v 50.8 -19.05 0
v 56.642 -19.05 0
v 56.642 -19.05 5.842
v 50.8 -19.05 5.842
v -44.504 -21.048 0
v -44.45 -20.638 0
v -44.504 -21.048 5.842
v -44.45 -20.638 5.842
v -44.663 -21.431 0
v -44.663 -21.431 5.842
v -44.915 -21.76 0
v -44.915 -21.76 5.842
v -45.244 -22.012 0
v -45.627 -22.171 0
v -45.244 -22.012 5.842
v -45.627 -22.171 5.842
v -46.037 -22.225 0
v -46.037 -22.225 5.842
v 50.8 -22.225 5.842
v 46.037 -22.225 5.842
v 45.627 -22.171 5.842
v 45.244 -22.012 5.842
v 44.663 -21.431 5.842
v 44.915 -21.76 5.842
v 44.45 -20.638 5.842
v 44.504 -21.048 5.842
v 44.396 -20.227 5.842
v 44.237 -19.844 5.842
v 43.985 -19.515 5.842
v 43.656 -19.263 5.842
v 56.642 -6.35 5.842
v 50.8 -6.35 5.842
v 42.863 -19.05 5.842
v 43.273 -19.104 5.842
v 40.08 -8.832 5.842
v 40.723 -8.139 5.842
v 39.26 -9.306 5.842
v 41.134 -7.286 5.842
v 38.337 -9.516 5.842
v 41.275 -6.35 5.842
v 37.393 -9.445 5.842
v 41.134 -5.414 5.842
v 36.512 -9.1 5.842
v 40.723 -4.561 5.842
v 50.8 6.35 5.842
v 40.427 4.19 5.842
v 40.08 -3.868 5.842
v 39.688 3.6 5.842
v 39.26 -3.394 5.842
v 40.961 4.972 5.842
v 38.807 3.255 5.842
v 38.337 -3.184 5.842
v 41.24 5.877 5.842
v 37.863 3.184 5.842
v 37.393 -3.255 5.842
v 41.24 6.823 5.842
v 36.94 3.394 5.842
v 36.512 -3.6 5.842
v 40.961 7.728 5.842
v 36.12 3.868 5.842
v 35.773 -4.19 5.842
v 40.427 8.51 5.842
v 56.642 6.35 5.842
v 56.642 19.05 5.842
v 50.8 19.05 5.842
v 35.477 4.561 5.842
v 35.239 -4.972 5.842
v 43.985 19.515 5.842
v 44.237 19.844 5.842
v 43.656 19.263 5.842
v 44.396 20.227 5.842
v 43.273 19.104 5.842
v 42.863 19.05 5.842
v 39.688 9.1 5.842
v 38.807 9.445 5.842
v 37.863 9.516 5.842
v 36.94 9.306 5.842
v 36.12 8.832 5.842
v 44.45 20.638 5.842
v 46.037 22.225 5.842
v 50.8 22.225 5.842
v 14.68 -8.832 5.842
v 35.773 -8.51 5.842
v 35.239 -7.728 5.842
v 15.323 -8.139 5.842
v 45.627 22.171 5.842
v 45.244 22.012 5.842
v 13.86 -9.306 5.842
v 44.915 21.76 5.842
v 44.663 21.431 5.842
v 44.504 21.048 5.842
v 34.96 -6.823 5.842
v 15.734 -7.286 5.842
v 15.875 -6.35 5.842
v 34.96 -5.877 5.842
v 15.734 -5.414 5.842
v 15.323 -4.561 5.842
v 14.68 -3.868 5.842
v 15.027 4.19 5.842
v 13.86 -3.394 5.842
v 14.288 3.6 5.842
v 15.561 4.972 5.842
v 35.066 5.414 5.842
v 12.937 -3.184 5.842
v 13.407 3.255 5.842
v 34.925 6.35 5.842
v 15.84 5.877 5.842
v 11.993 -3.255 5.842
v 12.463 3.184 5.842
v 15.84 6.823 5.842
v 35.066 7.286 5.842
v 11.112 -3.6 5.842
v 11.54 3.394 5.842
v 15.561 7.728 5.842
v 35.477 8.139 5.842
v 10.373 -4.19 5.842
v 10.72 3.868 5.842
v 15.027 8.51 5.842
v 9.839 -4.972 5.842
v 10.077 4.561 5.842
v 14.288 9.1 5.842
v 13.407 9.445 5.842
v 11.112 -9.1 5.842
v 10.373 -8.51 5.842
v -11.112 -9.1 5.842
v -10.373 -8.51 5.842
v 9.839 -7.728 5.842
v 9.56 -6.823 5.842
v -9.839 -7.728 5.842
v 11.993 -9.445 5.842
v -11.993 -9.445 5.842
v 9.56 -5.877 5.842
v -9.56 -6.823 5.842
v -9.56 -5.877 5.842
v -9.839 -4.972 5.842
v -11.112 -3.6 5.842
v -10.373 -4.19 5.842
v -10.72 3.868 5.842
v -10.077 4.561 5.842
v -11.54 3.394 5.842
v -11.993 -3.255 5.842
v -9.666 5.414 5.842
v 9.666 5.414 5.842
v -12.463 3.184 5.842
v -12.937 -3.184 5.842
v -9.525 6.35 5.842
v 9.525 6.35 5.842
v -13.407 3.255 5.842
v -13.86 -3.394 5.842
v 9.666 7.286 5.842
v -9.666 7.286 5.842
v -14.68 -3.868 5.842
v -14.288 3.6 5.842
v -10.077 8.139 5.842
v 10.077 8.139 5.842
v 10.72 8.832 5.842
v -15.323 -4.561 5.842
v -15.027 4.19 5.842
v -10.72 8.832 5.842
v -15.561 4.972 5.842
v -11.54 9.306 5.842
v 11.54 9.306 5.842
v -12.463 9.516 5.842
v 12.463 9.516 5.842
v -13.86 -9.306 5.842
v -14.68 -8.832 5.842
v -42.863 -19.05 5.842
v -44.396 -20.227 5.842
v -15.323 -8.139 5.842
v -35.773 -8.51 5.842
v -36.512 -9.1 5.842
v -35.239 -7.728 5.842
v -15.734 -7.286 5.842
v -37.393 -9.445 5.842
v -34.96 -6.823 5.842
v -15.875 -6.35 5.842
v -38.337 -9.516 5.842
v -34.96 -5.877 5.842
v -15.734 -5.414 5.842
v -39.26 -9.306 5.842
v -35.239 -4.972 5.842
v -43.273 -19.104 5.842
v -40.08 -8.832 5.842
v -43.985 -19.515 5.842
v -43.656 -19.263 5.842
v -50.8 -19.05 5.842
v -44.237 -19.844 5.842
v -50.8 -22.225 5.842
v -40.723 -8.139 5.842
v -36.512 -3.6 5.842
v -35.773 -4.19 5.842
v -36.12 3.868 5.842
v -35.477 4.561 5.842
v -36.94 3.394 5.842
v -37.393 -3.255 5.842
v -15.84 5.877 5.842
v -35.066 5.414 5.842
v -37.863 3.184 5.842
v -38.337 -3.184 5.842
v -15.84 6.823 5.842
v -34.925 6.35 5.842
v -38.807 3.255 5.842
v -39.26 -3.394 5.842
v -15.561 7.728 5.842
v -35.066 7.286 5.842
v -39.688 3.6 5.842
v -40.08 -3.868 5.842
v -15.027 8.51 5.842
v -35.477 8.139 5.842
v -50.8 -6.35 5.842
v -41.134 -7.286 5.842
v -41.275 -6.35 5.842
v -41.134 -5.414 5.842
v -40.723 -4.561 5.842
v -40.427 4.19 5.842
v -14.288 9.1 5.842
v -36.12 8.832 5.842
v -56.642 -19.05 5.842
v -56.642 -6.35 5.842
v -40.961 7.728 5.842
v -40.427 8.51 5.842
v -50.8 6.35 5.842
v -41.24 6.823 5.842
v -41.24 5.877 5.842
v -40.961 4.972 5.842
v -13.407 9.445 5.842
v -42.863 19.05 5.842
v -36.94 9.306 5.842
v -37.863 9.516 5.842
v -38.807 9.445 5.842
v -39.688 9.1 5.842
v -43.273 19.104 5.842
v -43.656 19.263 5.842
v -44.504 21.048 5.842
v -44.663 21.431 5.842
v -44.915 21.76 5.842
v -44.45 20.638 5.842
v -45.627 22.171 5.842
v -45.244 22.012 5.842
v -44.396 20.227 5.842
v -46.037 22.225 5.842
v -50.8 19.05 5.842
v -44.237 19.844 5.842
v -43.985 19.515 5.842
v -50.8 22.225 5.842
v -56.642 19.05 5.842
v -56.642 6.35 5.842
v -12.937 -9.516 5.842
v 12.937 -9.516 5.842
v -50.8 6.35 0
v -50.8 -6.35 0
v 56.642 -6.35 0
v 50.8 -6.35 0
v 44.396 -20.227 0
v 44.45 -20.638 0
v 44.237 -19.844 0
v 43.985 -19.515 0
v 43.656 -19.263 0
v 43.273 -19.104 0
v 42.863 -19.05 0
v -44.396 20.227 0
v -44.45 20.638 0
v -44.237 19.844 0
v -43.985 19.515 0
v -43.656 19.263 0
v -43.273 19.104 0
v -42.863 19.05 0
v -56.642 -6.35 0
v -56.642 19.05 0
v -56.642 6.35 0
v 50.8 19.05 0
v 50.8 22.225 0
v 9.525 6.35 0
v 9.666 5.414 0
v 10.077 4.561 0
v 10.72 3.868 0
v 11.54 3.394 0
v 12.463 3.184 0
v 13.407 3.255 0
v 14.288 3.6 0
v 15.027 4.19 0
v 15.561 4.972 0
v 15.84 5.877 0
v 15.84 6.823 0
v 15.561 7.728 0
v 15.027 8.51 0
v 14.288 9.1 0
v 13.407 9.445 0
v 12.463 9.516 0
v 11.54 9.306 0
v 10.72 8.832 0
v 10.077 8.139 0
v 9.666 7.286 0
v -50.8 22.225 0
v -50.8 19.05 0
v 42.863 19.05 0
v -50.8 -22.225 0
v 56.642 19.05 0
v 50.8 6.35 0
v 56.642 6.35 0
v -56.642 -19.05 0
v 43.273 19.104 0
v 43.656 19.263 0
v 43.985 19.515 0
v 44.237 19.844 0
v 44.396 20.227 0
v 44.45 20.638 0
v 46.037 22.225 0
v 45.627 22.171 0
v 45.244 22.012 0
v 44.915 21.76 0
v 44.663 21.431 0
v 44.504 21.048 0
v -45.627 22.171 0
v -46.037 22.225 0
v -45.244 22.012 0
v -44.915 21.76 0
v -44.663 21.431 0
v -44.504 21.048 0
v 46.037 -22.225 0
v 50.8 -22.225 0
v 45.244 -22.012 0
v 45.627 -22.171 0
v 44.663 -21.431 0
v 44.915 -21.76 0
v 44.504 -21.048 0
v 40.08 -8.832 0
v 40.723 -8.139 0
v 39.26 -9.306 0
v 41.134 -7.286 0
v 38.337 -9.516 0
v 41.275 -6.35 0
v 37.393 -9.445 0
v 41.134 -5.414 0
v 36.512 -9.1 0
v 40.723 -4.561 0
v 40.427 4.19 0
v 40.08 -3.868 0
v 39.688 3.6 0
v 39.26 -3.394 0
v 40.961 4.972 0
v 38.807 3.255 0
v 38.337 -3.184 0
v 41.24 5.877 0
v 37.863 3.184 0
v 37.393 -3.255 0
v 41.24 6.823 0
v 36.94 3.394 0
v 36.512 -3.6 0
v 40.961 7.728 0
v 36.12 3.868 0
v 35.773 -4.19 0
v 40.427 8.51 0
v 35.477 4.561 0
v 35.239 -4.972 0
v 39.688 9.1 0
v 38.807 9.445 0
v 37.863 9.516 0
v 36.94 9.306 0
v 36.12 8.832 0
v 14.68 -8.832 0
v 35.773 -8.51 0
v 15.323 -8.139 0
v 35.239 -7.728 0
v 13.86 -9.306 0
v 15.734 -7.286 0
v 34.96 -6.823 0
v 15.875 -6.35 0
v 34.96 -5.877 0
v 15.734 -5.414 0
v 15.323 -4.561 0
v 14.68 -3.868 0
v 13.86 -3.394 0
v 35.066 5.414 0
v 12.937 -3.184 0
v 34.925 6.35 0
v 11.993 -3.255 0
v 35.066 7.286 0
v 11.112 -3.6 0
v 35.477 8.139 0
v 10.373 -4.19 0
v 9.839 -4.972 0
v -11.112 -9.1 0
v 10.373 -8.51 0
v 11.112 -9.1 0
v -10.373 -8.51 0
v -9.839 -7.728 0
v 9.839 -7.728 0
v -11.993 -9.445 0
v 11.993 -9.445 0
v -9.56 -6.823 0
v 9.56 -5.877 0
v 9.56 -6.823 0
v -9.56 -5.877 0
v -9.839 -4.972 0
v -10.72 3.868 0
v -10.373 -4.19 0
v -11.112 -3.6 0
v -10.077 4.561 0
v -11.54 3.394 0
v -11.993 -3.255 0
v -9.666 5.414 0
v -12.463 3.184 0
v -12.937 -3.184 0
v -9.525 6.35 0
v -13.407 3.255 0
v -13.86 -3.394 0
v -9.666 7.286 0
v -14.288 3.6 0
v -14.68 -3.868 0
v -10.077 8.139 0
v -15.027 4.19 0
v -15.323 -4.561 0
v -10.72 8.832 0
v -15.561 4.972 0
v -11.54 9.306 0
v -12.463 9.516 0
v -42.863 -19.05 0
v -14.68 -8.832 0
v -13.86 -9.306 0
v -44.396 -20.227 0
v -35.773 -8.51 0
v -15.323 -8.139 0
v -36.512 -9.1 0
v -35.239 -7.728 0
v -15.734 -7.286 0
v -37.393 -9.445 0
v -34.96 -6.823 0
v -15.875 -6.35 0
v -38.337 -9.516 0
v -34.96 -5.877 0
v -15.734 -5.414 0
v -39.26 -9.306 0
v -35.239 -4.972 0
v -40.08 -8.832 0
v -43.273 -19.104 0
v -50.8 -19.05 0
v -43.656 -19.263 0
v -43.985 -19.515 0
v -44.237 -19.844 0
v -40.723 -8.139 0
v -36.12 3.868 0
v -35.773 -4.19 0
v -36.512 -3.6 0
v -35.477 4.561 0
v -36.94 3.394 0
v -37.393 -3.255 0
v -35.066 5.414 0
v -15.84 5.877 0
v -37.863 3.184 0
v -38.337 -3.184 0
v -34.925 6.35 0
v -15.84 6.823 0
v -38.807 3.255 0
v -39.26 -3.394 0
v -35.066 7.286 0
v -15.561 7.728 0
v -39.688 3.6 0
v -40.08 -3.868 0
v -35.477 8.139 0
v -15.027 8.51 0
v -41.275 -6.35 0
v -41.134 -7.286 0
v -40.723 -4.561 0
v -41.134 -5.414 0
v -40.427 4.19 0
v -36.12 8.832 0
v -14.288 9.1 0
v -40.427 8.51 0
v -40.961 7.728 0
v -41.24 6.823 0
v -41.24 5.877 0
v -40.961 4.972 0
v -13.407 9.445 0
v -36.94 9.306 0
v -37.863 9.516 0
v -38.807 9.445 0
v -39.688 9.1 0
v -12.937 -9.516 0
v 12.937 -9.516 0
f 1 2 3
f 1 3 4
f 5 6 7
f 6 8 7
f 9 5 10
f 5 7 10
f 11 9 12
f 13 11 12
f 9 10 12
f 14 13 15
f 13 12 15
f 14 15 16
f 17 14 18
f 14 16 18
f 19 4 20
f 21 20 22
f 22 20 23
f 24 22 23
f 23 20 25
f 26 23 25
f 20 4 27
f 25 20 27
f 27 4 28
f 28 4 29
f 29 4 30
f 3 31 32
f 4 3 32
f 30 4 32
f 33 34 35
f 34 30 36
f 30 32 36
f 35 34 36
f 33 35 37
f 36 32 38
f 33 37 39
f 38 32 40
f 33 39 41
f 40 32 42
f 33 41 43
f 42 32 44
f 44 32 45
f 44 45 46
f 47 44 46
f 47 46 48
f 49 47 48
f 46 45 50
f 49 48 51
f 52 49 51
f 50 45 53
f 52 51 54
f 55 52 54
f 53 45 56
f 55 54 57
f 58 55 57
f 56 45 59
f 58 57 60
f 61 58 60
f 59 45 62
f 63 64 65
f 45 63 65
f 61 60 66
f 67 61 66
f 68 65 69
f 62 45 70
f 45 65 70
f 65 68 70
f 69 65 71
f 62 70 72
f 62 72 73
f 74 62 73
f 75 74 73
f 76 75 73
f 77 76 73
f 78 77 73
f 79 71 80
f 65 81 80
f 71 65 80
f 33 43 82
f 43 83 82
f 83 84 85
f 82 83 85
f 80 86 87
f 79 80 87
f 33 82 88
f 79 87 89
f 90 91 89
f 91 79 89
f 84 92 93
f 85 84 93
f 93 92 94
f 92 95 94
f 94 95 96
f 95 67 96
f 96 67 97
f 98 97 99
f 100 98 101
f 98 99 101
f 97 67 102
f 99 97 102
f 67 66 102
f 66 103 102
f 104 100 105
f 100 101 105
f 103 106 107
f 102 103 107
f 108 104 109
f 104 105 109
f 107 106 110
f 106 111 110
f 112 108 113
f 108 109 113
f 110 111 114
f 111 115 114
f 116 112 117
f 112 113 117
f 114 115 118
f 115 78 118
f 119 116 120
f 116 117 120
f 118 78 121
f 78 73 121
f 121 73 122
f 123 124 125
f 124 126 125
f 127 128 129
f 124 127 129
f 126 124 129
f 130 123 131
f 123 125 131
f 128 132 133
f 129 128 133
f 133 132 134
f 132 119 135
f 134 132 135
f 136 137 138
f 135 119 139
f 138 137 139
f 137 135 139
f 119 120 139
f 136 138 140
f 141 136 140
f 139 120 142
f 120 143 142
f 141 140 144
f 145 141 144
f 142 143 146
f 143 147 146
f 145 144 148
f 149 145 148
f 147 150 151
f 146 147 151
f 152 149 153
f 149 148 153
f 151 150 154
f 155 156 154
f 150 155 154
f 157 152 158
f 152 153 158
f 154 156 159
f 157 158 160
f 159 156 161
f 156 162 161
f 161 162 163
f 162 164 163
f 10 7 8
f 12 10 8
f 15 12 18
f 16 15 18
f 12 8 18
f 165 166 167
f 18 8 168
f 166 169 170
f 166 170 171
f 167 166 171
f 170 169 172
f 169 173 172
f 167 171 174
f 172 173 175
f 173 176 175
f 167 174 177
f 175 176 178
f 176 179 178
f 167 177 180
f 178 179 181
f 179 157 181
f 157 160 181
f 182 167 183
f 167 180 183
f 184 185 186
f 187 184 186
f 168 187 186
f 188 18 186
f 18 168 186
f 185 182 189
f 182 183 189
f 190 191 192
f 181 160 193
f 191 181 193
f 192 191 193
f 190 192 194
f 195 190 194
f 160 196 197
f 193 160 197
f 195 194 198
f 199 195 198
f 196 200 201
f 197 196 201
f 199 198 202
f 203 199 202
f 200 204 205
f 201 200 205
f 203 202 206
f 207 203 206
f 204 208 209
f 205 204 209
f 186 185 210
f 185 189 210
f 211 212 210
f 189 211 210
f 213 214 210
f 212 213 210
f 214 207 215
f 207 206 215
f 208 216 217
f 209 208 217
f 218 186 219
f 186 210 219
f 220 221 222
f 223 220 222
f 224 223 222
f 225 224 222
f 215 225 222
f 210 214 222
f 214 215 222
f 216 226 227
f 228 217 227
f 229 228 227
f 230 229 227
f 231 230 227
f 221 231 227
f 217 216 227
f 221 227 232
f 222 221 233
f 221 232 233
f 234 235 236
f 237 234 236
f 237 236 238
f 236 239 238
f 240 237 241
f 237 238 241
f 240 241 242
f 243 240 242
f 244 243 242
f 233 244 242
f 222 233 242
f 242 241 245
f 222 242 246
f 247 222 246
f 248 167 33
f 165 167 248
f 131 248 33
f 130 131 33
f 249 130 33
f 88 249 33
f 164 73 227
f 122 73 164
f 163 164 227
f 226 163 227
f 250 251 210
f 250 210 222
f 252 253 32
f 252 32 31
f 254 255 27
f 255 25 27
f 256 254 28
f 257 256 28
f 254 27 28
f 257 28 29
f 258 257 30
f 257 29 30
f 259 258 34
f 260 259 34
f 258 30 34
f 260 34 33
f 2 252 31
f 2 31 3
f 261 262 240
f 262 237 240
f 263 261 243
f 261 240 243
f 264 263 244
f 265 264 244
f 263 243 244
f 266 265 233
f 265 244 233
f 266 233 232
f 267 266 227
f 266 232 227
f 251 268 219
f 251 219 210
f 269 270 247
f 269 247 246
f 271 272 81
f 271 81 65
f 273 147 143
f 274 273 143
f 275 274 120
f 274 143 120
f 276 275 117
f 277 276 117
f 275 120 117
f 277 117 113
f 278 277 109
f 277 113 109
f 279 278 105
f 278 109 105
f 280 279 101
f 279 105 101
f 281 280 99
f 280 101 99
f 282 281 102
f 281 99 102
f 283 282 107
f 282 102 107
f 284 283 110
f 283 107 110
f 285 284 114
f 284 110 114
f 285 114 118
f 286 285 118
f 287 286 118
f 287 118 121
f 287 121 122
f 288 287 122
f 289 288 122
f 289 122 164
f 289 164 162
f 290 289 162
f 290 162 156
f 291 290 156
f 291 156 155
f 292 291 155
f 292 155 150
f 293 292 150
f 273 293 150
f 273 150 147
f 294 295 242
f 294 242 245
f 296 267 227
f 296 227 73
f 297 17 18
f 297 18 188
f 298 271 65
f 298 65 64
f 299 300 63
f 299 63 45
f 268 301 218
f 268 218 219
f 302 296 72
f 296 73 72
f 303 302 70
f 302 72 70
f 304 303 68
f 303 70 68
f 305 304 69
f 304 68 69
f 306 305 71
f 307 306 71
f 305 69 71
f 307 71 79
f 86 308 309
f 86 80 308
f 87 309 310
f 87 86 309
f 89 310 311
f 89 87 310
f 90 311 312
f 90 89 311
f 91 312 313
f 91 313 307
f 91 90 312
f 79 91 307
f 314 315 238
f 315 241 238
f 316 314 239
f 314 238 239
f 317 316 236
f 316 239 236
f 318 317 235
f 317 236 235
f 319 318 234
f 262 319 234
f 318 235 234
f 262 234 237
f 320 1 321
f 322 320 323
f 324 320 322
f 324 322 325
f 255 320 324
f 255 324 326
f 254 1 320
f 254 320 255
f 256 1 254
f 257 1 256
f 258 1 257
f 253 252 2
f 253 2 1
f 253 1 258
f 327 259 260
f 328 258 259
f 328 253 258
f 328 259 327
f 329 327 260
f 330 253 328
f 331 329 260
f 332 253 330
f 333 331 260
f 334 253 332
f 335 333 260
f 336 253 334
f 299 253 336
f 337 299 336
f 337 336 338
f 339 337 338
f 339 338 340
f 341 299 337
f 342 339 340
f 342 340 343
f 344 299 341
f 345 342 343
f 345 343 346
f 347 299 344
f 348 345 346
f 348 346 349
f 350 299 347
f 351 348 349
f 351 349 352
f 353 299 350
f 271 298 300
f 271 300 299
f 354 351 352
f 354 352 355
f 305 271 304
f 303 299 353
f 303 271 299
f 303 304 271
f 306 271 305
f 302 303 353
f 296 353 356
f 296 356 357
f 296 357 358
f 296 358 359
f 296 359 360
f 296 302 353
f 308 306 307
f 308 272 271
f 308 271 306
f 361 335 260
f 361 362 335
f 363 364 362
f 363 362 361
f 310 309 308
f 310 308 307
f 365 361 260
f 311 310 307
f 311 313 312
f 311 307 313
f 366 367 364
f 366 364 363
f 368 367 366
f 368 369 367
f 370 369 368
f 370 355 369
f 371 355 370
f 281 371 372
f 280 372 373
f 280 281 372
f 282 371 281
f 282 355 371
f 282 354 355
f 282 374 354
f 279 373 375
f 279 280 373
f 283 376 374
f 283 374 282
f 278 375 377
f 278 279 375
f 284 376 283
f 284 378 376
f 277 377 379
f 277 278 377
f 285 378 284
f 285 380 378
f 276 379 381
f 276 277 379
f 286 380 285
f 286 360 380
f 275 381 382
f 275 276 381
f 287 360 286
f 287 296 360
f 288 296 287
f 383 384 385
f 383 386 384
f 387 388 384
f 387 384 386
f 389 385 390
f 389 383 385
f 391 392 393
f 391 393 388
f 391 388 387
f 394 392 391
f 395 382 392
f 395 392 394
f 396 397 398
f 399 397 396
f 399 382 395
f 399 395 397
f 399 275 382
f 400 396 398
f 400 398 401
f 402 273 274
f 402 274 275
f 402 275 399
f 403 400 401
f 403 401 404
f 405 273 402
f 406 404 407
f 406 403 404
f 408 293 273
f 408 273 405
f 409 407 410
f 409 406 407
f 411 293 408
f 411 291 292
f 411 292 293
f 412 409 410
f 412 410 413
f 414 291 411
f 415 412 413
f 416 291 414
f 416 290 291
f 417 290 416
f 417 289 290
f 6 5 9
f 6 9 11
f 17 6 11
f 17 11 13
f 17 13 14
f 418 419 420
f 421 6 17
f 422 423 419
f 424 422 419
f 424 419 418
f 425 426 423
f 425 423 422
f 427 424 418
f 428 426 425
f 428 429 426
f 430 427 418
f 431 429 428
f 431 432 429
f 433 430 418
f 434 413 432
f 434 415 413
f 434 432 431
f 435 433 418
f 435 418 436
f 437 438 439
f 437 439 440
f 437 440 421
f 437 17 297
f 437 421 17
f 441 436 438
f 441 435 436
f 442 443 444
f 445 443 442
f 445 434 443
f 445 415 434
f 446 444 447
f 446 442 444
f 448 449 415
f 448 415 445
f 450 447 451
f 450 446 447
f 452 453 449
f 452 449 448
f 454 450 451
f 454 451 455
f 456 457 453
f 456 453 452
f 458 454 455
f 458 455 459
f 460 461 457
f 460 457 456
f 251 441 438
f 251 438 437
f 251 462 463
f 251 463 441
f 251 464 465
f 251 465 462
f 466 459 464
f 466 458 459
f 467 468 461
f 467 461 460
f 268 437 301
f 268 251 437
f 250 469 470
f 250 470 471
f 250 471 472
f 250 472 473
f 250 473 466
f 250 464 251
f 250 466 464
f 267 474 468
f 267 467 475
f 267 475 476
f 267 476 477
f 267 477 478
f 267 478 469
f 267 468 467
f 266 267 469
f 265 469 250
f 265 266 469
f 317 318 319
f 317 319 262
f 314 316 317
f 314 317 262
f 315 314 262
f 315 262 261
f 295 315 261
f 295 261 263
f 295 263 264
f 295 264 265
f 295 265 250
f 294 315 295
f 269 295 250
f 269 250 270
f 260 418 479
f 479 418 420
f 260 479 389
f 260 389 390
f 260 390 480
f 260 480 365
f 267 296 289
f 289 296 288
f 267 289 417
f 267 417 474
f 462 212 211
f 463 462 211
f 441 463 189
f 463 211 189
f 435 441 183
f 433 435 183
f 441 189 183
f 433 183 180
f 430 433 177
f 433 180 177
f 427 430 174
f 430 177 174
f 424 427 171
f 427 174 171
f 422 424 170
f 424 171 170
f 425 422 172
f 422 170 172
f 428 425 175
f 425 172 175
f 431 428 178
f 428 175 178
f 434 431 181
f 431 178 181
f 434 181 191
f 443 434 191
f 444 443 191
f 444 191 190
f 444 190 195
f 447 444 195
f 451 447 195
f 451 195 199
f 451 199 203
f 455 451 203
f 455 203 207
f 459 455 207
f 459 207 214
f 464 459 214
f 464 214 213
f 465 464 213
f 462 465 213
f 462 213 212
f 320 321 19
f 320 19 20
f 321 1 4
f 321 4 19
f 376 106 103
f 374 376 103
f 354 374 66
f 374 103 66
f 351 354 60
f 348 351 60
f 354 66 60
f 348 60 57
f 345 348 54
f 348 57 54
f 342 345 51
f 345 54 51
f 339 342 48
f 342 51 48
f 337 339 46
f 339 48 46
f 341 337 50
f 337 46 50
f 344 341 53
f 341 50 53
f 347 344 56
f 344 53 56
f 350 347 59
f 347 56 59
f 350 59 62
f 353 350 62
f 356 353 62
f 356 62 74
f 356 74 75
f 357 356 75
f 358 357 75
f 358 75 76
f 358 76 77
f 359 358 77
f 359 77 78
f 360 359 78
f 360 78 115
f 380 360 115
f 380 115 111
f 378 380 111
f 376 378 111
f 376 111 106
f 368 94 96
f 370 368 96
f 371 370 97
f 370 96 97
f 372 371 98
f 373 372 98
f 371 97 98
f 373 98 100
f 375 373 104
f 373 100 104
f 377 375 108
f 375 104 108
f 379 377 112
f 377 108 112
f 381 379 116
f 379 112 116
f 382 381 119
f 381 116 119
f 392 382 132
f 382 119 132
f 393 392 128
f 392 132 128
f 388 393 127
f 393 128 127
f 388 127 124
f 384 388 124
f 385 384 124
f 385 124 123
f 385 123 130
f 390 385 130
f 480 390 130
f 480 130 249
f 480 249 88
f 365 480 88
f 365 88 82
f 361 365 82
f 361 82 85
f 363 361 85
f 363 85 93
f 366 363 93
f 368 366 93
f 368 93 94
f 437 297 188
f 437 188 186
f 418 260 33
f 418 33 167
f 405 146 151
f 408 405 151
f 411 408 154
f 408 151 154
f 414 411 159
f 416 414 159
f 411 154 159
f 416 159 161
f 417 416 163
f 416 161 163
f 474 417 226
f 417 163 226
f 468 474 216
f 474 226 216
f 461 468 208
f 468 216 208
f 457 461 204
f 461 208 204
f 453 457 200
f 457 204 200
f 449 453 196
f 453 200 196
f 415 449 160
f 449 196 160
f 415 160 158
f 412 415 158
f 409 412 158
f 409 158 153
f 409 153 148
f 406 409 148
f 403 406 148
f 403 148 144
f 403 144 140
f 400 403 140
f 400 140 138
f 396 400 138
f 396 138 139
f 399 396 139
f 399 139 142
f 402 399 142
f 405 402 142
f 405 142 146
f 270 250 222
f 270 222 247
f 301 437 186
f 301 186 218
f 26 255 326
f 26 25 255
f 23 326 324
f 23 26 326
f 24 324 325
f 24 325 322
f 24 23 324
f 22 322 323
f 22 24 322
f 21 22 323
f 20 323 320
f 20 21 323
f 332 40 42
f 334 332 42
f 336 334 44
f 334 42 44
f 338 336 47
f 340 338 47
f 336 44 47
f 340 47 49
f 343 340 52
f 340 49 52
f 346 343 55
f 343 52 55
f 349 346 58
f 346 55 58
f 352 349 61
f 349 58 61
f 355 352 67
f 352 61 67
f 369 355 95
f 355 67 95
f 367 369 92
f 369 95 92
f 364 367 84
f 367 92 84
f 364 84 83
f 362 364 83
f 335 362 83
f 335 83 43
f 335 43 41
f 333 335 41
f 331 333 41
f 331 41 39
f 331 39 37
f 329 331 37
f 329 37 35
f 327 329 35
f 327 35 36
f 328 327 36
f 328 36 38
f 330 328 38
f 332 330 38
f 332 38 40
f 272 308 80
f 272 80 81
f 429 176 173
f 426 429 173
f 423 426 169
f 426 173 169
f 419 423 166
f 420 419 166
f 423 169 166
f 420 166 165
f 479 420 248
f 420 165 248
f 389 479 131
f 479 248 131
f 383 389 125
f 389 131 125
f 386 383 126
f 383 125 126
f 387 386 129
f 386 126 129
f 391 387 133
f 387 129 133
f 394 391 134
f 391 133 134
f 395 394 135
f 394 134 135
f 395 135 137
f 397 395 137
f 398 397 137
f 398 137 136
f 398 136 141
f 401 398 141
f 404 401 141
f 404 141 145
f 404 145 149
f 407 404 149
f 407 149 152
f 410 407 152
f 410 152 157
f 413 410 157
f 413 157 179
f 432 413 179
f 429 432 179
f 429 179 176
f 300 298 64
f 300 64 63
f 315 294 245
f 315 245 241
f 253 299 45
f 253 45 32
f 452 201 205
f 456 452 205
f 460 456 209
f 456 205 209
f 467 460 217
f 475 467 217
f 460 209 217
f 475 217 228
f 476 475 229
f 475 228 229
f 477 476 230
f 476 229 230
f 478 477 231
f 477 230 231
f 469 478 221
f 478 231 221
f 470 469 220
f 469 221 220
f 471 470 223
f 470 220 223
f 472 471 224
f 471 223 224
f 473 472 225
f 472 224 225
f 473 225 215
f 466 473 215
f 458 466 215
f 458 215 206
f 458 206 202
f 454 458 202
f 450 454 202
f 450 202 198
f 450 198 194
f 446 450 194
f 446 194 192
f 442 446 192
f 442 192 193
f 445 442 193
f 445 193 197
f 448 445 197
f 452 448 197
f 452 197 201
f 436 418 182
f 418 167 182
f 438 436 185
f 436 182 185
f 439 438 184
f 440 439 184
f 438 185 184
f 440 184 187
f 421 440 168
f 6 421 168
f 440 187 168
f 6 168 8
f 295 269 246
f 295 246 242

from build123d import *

# Parameters (mm, degrees)
BOSS_EXTRUDE1_DEPTH = 5.842
FILLET1_R           = 1.5875
SKETCH2_R           = 3.175
CUT_EXTRUDE1_DEPTH  = 62.126064432


with BuildPart() as part:
    # Sketch1 → Boss-Extrude1 (new body)
    with BuildSketch(Plane.XY):
        Polygon((50.8, -22.225), (44.45, -22.225), (44.45, -19.05), (-44.45, -19.05), (-44.45, -22.225), (-50.8, -22.225), (-50.8, -19.05), (-56.642, -19.05), (-56.642, -6.35), (-50.8, -6.35), (-50.8, 6.35), (-56.642, 6.35), (-56.642, 19.05), (-50.8, 19.05), (-50.8, 22.225), (-44.45, 22.225), (-44.45, 19.05), (44.45, 19.05), (44.45, 22.225), (50.8, 22.225), (50.8, 19.05), (56.642, 19.05), (56.642, 6.35), (50.8, 6.35), (50.8, -6.35), (56.642, -6.35), (56.642, -19.05), (50.8, -19.05), align=None)
    extrude(amount=BOSS_EXTRUDE1_DEPTH)

    # Fillet1
    fillet1_edges = [part.edges().sort_by_distance(p)[0] for p in [
        (-44.45, -19.05, 2.921),
        (44.45, -19.05, 2.921),
        (44.45, 19.05, 2.921),
        (-44.45, 19.05, 2.921),
    ]]
    fillet(fillet1_edges, radius=FILLET1_R)
    fillet1_2_edges = [part.edges().sort_by_distance(p)[0] for p in [
        (-44.45, -22.225, 2.921),
        (44.45, -22.225, 2.921),
        (44.45, 22.225, 2.921),
        (-44.45, 22.225, 2.921),
    ]]
    fillet(fillet1_2_edges, radius=FILLET1_R - 0.0001)  # a hair under: the kernel refuses the full size

    # Sketch2 → Cut-Extrude1 (cut, through all)
    with BuildSketch(Plane.XY.offset(5.842)):
        with Locations((-38.1, 6.35)):
            Circle(SKETCH2_R)
        with Locations((-12.7, 6.35)):
            Circle(SKETCH2_R)
        with Locations(Location((-12.7, -6.35, 0), (0, 0, 180))):
            Circle(SKETCH2_R)
        with Locations(Location((-38.1, -6.35, 0), (0, 0, 180))):
            Circle(SKETCH2_R)
        with Locations((38.1, -6.35)):
            Circle(SKETCH2_R)
        with Locations((12.7, -6.35)):
            Circle(SKETCH2_R)
        with Locations(Location((12.7, 6.35, 0), (0, 0, 180))):
            Circle(SKETCH2_R)
        with Locations(Location((38.1, 6.35, 0), (0, 0, 180))):
            Circle(SKETCH2_R)
    extrude(amount=-CUT_EXTRUDE1_DEPTH, mode=Mode.SUBTRACT)


solid = part.part
